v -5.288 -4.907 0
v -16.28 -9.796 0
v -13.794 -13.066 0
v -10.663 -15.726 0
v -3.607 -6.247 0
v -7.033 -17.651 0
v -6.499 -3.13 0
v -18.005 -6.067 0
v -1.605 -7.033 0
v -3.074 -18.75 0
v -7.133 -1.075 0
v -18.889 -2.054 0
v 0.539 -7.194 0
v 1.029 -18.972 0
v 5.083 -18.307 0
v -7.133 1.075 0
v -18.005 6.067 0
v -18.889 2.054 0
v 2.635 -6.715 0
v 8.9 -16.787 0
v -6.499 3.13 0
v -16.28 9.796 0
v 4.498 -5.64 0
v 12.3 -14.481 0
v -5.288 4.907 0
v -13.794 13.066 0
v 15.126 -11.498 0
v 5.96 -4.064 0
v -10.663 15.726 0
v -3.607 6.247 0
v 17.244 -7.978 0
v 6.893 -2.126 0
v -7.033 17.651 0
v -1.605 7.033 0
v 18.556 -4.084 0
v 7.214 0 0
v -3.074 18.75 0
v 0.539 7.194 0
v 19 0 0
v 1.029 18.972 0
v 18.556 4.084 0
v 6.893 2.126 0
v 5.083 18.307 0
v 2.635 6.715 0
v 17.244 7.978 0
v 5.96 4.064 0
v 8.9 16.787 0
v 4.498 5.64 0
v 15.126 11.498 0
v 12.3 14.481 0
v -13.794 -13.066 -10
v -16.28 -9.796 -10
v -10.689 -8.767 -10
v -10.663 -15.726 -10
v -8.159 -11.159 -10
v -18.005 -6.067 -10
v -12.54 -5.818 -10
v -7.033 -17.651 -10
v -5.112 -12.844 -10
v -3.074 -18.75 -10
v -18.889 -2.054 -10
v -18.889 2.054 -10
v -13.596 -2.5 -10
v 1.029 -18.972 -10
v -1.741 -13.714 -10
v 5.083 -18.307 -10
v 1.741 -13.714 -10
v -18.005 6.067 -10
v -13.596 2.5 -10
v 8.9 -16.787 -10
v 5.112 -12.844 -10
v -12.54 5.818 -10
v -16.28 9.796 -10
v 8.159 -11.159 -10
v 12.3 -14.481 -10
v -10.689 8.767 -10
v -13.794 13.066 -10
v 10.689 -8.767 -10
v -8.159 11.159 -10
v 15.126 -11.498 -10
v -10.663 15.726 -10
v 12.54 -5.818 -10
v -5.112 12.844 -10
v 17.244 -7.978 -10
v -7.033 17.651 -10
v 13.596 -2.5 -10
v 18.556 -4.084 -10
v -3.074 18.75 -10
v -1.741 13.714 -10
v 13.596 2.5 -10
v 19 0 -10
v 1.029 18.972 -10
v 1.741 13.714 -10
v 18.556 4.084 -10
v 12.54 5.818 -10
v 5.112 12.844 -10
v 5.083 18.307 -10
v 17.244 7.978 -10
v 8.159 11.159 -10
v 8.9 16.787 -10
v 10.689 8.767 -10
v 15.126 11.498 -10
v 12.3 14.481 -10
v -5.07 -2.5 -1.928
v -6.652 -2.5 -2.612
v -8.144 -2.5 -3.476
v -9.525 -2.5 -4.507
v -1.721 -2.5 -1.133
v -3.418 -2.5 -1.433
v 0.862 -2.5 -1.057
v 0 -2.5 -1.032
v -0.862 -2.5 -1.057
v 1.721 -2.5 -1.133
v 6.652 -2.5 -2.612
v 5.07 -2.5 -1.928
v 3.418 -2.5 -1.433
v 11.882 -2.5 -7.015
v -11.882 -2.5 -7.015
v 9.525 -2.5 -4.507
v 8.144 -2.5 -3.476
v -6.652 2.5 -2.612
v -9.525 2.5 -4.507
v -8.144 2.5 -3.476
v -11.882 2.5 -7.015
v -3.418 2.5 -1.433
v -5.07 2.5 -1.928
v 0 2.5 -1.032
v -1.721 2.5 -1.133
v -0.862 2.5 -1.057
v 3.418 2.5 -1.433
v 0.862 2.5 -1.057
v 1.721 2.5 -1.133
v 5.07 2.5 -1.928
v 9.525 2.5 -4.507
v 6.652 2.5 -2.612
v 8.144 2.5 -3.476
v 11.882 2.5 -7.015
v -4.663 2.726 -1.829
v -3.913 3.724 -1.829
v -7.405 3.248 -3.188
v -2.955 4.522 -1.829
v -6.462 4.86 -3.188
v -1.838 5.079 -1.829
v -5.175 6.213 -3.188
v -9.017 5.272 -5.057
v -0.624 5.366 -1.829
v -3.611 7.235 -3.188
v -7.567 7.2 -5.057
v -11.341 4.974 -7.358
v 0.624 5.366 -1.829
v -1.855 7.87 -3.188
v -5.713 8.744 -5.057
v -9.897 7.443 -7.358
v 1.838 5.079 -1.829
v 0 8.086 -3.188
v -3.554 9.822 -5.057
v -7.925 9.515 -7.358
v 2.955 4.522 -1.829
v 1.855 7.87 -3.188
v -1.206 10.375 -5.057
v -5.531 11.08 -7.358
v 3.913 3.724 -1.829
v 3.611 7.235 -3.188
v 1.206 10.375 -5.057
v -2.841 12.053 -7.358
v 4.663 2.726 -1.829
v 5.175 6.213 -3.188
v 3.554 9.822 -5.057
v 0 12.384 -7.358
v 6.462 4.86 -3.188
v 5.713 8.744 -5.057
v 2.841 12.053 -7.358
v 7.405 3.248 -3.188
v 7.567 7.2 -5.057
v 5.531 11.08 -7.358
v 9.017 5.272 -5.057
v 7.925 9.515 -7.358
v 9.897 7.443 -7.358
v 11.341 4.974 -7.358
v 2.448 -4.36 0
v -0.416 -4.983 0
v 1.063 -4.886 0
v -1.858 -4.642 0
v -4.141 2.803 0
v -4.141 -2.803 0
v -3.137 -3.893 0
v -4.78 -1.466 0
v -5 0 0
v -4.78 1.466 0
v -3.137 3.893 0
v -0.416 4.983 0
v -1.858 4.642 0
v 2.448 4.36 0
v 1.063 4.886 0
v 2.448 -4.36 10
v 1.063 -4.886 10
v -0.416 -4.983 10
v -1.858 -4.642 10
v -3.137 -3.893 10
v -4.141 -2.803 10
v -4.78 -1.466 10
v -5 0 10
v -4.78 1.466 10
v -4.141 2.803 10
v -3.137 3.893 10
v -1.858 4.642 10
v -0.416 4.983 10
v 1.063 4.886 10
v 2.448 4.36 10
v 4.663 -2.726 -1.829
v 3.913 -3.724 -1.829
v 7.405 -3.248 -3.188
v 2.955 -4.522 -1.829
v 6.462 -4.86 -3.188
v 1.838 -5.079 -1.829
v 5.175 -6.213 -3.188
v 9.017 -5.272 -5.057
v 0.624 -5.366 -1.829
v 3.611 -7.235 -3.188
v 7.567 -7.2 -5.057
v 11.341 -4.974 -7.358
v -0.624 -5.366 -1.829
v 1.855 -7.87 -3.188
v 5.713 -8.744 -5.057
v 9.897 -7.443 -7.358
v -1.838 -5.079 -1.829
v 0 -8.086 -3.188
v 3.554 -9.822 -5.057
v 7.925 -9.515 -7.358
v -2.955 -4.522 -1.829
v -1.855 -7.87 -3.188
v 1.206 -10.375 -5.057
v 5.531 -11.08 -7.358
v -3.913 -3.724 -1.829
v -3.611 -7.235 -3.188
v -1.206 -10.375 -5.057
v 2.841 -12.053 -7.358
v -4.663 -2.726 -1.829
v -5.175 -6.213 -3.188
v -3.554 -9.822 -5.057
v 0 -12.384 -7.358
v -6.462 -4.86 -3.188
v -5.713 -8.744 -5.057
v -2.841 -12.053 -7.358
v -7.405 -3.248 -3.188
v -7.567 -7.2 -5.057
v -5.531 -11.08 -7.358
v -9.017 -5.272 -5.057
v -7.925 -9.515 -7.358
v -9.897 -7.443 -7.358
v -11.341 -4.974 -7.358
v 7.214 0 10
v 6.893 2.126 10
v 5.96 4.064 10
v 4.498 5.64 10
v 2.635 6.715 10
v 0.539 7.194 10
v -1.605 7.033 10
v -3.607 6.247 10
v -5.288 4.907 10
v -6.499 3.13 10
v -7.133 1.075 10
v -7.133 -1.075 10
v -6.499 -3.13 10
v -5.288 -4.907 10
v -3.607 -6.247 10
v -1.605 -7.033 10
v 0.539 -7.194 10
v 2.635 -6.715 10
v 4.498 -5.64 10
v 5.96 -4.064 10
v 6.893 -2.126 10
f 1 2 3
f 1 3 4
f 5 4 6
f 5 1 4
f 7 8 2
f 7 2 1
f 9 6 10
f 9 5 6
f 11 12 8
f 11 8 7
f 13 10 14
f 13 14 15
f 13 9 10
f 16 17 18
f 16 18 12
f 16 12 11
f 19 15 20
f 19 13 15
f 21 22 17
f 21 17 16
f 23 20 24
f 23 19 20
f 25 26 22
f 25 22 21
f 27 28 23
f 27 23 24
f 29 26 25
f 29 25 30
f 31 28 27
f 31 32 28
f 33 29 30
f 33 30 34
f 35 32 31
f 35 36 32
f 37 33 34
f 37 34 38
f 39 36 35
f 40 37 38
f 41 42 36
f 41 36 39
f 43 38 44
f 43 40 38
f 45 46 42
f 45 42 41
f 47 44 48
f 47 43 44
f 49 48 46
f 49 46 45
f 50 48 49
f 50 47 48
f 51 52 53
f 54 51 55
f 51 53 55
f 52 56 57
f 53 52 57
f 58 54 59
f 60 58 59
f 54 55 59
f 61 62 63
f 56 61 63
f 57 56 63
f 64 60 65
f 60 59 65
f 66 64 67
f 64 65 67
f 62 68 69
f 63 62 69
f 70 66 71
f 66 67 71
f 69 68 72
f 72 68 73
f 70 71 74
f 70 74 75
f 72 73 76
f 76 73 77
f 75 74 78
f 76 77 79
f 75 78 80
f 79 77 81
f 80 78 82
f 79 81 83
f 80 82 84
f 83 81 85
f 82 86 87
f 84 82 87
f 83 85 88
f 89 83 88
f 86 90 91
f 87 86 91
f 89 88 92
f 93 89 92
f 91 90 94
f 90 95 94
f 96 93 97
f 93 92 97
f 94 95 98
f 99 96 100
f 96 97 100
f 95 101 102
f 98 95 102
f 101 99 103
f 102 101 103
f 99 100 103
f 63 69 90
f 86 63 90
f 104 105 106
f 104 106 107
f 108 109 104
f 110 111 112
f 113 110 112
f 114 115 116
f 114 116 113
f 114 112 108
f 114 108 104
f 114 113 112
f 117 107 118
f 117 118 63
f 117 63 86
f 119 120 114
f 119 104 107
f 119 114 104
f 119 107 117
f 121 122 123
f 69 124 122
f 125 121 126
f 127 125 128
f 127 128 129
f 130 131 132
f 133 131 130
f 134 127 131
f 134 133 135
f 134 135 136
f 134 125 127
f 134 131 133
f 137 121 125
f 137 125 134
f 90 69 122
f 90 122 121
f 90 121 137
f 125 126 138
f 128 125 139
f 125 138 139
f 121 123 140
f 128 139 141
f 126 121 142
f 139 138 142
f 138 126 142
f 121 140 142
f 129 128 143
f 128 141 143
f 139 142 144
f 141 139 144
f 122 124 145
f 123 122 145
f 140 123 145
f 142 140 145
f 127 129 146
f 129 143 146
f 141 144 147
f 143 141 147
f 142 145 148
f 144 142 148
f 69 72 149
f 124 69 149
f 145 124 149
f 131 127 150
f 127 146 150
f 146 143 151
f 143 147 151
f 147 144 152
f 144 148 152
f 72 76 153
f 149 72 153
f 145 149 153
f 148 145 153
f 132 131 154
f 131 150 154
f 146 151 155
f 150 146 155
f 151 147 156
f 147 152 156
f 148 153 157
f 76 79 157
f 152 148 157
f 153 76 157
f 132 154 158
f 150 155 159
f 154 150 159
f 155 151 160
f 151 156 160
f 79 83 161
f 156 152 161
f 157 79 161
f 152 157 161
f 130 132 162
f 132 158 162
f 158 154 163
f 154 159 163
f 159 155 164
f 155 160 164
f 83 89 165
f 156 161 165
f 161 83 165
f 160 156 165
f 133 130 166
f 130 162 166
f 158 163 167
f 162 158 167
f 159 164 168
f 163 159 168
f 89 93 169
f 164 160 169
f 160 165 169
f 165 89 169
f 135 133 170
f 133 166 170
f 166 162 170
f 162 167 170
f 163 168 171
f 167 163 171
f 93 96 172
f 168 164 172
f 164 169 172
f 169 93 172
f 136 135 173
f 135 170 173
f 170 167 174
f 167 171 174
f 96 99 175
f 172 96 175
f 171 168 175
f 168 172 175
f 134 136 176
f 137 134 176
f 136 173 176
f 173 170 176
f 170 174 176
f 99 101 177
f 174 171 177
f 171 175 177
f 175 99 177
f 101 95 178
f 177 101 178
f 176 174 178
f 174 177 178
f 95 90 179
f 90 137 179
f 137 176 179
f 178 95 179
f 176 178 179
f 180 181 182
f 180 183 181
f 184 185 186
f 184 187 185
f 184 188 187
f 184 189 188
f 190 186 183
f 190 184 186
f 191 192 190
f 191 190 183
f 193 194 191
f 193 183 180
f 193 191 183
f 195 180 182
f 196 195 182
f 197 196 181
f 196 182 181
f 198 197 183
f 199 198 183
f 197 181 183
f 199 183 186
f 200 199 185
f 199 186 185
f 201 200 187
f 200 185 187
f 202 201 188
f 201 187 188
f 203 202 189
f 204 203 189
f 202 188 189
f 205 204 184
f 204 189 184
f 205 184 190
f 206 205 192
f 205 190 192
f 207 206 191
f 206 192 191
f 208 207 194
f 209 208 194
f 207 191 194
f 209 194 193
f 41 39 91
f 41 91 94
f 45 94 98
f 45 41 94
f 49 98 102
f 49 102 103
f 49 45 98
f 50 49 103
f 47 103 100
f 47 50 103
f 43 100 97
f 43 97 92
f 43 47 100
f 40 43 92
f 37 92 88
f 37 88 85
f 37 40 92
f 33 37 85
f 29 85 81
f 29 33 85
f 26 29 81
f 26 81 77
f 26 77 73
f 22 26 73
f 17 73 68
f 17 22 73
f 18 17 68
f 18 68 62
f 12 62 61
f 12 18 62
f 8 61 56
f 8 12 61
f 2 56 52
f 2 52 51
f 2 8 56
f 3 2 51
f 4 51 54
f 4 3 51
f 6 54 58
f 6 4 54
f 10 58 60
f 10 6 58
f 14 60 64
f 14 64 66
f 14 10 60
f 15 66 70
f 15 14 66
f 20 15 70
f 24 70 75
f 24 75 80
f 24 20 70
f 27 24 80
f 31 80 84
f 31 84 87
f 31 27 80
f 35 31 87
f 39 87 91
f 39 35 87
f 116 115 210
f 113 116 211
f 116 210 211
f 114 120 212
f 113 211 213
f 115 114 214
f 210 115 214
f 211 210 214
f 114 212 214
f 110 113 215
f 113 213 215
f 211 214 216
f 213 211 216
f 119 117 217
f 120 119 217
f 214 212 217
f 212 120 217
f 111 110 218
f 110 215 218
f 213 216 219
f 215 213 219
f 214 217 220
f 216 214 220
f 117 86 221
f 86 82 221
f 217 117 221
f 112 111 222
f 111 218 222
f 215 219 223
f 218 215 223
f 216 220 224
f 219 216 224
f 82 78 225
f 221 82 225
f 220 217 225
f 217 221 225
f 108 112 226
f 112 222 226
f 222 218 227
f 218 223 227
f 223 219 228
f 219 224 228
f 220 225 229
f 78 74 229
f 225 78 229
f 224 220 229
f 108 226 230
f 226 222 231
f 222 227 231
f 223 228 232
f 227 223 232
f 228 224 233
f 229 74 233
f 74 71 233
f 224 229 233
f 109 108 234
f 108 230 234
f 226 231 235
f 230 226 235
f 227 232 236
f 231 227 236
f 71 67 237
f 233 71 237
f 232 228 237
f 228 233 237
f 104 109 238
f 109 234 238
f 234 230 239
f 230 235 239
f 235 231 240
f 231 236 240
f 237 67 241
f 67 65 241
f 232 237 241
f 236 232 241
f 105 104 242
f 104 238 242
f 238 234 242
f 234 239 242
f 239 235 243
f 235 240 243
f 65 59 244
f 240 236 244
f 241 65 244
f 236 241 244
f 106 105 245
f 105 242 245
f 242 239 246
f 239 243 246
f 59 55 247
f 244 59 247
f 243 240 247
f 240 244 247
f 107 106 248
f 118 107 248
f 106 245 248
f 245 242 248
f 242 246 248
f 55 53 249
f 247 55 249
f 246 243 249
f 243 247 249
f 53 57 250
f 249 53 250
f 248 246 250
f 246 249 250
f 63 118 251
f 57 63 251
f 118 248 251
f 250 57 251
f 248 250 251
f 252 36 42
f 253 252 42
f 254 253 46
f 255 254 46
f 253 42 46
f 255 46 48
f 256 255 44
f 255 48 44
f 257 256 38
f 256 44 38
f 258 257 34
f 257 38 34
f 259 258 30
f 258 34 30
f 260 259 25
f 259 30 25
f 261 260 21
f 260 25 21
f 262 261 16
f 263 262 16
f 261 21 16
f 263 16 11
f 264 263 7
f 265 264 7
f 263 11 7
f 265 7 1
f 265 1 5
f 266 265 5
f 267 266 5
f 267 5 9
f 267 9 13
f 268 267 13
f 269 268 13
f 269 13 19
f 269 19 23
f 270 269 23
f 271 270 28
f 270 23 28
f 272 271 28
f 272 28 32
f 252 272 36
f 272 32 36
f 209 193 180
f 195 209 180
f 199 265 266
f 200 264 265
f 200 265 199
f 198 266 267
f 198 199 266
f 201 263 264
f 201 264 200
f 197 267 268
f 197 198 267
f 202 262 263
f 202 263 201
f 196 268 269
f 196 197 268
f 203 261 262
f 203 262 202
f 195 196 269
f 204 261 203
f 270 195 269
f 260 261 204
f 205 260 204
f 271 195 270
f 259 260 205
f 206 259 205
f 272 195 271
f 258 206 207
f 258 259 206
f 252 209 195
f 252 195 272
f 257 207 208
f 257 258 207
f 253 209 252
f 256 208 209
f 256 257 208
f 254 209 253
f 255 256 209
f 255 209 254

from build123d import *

# Parameters (mm, degrees)
F0_R      = 7.213779
F1_DEPTH  = 10
F2_DEPTH  = 10
F3_R      = 19
F4_DEPTH  = 10
F7_DEPTH  = 2.5
F8_DEPTH  = 2.5
F9_R      = 20.252872
F10_DEPTH = 20.822358


with BuildPart() as f1:
    # F0 (on Top) → F1 (new body)
    with BuildSketch(Plane.XY):
        Circle(F0_R)
        with BuildLine():
            ThreePointArc((2.448212, 4.359617), (4.315151, 2.525761), (5, 0))
            ThreePointArc((5, 0), (4.315151, -2.525761), (2.448212, -4.359617))
            ThreePointArc((2.448212, -4.359617), (-5, 0), (2.448212, 4.359617))
        make_face(mode=Mode.SUBTRACT)
    extrude(amount=F1_DEPTH)

    # F0 (on Top) → F2 (join)
    with BuildSketch(Plane.XY):
        with BuildLine():
            ThreePointArc((2.448212, -4.359617), (4.315151, -2.525761), (5, 0))
            ThreePointArc((5, 0), (4.315151, 2.525761), (2.448212, 4.359617))
            Line((2.448212, 4.359617), (2.448212, -4.359617))
        make_face()
    extrude(amount=F2_DEPTH)

    # F3 (on Top) → F4 (join)
    with BuildSketch(Plane.XY):
        Circle(F3_R)
    extrude(amount=-F4_DEPTH)

    # F5 (on Front) → F6 (revolve, cut)
    with BuildSketch(Plane.XZ):
        with BuildLine():
            Line((0, -30.822358), (0, -0.822358))
            ThreePointArc((0, -0.822358), (-15, -15.822358), (0, -30.822358))
        make_face()
    revolve(axis=Axis((0, 0, -15.822358), (0, 0, -1)), mode=Mode.SUBTRACT)

    # F5 (on Front) → F7 (join)
    with BuildSketch(Plane.XZ):
        with BuildLine():
            ThreePointArc((0, -30.822358), (10.606602, -26.42896), (15, -15.822358))
            ThreePointArc((15, -15.822358), (10.606602, -5.215757), (0, -0.822358))
            Line((0, -0.822358), (0, -30.822358))
        make_face()
        with BuildLine():
            Line((0, -30.822358), (0, -0.822358))
            ThreePointArc((0, -0.822358), (-15, -15.822358), (0, -30.822358))
        make_face()
    extrude(amount=F7_DEPTH)

    # F7_face (on face) → F8 (join)
    with BuildSketch(Plane(origin=(0, 0, -15.822358), x_dir=(1, 0, 0), z_dir=(0, 1, 0))):
        with BuildLine():
            ThreePointArc((-13.823898, -5.822358), (-8.296524, -12.496707), (0, -15))
            ThreePointArc((0, -15), (8.296524, -12.496707), (13.823898, -5.822358))
            ThreePointArc((13.823898, -5.822358), (0, 15), (-13.823898, -5.822358))
        make_face()
    extrude(amount=F8_DEPTH)

    # F9 (on face) → F10 (cut, through all)
    with BuildSketch(Plane(origin=(0, 0, -10), x_dir=(1, 0, 0), z_dir=(0, 0, -1))):
        Circle(F9_R)
    extrude(amount=F10_DEPTH, mode=Mode.SUBTRACT)


solid = f1.part
